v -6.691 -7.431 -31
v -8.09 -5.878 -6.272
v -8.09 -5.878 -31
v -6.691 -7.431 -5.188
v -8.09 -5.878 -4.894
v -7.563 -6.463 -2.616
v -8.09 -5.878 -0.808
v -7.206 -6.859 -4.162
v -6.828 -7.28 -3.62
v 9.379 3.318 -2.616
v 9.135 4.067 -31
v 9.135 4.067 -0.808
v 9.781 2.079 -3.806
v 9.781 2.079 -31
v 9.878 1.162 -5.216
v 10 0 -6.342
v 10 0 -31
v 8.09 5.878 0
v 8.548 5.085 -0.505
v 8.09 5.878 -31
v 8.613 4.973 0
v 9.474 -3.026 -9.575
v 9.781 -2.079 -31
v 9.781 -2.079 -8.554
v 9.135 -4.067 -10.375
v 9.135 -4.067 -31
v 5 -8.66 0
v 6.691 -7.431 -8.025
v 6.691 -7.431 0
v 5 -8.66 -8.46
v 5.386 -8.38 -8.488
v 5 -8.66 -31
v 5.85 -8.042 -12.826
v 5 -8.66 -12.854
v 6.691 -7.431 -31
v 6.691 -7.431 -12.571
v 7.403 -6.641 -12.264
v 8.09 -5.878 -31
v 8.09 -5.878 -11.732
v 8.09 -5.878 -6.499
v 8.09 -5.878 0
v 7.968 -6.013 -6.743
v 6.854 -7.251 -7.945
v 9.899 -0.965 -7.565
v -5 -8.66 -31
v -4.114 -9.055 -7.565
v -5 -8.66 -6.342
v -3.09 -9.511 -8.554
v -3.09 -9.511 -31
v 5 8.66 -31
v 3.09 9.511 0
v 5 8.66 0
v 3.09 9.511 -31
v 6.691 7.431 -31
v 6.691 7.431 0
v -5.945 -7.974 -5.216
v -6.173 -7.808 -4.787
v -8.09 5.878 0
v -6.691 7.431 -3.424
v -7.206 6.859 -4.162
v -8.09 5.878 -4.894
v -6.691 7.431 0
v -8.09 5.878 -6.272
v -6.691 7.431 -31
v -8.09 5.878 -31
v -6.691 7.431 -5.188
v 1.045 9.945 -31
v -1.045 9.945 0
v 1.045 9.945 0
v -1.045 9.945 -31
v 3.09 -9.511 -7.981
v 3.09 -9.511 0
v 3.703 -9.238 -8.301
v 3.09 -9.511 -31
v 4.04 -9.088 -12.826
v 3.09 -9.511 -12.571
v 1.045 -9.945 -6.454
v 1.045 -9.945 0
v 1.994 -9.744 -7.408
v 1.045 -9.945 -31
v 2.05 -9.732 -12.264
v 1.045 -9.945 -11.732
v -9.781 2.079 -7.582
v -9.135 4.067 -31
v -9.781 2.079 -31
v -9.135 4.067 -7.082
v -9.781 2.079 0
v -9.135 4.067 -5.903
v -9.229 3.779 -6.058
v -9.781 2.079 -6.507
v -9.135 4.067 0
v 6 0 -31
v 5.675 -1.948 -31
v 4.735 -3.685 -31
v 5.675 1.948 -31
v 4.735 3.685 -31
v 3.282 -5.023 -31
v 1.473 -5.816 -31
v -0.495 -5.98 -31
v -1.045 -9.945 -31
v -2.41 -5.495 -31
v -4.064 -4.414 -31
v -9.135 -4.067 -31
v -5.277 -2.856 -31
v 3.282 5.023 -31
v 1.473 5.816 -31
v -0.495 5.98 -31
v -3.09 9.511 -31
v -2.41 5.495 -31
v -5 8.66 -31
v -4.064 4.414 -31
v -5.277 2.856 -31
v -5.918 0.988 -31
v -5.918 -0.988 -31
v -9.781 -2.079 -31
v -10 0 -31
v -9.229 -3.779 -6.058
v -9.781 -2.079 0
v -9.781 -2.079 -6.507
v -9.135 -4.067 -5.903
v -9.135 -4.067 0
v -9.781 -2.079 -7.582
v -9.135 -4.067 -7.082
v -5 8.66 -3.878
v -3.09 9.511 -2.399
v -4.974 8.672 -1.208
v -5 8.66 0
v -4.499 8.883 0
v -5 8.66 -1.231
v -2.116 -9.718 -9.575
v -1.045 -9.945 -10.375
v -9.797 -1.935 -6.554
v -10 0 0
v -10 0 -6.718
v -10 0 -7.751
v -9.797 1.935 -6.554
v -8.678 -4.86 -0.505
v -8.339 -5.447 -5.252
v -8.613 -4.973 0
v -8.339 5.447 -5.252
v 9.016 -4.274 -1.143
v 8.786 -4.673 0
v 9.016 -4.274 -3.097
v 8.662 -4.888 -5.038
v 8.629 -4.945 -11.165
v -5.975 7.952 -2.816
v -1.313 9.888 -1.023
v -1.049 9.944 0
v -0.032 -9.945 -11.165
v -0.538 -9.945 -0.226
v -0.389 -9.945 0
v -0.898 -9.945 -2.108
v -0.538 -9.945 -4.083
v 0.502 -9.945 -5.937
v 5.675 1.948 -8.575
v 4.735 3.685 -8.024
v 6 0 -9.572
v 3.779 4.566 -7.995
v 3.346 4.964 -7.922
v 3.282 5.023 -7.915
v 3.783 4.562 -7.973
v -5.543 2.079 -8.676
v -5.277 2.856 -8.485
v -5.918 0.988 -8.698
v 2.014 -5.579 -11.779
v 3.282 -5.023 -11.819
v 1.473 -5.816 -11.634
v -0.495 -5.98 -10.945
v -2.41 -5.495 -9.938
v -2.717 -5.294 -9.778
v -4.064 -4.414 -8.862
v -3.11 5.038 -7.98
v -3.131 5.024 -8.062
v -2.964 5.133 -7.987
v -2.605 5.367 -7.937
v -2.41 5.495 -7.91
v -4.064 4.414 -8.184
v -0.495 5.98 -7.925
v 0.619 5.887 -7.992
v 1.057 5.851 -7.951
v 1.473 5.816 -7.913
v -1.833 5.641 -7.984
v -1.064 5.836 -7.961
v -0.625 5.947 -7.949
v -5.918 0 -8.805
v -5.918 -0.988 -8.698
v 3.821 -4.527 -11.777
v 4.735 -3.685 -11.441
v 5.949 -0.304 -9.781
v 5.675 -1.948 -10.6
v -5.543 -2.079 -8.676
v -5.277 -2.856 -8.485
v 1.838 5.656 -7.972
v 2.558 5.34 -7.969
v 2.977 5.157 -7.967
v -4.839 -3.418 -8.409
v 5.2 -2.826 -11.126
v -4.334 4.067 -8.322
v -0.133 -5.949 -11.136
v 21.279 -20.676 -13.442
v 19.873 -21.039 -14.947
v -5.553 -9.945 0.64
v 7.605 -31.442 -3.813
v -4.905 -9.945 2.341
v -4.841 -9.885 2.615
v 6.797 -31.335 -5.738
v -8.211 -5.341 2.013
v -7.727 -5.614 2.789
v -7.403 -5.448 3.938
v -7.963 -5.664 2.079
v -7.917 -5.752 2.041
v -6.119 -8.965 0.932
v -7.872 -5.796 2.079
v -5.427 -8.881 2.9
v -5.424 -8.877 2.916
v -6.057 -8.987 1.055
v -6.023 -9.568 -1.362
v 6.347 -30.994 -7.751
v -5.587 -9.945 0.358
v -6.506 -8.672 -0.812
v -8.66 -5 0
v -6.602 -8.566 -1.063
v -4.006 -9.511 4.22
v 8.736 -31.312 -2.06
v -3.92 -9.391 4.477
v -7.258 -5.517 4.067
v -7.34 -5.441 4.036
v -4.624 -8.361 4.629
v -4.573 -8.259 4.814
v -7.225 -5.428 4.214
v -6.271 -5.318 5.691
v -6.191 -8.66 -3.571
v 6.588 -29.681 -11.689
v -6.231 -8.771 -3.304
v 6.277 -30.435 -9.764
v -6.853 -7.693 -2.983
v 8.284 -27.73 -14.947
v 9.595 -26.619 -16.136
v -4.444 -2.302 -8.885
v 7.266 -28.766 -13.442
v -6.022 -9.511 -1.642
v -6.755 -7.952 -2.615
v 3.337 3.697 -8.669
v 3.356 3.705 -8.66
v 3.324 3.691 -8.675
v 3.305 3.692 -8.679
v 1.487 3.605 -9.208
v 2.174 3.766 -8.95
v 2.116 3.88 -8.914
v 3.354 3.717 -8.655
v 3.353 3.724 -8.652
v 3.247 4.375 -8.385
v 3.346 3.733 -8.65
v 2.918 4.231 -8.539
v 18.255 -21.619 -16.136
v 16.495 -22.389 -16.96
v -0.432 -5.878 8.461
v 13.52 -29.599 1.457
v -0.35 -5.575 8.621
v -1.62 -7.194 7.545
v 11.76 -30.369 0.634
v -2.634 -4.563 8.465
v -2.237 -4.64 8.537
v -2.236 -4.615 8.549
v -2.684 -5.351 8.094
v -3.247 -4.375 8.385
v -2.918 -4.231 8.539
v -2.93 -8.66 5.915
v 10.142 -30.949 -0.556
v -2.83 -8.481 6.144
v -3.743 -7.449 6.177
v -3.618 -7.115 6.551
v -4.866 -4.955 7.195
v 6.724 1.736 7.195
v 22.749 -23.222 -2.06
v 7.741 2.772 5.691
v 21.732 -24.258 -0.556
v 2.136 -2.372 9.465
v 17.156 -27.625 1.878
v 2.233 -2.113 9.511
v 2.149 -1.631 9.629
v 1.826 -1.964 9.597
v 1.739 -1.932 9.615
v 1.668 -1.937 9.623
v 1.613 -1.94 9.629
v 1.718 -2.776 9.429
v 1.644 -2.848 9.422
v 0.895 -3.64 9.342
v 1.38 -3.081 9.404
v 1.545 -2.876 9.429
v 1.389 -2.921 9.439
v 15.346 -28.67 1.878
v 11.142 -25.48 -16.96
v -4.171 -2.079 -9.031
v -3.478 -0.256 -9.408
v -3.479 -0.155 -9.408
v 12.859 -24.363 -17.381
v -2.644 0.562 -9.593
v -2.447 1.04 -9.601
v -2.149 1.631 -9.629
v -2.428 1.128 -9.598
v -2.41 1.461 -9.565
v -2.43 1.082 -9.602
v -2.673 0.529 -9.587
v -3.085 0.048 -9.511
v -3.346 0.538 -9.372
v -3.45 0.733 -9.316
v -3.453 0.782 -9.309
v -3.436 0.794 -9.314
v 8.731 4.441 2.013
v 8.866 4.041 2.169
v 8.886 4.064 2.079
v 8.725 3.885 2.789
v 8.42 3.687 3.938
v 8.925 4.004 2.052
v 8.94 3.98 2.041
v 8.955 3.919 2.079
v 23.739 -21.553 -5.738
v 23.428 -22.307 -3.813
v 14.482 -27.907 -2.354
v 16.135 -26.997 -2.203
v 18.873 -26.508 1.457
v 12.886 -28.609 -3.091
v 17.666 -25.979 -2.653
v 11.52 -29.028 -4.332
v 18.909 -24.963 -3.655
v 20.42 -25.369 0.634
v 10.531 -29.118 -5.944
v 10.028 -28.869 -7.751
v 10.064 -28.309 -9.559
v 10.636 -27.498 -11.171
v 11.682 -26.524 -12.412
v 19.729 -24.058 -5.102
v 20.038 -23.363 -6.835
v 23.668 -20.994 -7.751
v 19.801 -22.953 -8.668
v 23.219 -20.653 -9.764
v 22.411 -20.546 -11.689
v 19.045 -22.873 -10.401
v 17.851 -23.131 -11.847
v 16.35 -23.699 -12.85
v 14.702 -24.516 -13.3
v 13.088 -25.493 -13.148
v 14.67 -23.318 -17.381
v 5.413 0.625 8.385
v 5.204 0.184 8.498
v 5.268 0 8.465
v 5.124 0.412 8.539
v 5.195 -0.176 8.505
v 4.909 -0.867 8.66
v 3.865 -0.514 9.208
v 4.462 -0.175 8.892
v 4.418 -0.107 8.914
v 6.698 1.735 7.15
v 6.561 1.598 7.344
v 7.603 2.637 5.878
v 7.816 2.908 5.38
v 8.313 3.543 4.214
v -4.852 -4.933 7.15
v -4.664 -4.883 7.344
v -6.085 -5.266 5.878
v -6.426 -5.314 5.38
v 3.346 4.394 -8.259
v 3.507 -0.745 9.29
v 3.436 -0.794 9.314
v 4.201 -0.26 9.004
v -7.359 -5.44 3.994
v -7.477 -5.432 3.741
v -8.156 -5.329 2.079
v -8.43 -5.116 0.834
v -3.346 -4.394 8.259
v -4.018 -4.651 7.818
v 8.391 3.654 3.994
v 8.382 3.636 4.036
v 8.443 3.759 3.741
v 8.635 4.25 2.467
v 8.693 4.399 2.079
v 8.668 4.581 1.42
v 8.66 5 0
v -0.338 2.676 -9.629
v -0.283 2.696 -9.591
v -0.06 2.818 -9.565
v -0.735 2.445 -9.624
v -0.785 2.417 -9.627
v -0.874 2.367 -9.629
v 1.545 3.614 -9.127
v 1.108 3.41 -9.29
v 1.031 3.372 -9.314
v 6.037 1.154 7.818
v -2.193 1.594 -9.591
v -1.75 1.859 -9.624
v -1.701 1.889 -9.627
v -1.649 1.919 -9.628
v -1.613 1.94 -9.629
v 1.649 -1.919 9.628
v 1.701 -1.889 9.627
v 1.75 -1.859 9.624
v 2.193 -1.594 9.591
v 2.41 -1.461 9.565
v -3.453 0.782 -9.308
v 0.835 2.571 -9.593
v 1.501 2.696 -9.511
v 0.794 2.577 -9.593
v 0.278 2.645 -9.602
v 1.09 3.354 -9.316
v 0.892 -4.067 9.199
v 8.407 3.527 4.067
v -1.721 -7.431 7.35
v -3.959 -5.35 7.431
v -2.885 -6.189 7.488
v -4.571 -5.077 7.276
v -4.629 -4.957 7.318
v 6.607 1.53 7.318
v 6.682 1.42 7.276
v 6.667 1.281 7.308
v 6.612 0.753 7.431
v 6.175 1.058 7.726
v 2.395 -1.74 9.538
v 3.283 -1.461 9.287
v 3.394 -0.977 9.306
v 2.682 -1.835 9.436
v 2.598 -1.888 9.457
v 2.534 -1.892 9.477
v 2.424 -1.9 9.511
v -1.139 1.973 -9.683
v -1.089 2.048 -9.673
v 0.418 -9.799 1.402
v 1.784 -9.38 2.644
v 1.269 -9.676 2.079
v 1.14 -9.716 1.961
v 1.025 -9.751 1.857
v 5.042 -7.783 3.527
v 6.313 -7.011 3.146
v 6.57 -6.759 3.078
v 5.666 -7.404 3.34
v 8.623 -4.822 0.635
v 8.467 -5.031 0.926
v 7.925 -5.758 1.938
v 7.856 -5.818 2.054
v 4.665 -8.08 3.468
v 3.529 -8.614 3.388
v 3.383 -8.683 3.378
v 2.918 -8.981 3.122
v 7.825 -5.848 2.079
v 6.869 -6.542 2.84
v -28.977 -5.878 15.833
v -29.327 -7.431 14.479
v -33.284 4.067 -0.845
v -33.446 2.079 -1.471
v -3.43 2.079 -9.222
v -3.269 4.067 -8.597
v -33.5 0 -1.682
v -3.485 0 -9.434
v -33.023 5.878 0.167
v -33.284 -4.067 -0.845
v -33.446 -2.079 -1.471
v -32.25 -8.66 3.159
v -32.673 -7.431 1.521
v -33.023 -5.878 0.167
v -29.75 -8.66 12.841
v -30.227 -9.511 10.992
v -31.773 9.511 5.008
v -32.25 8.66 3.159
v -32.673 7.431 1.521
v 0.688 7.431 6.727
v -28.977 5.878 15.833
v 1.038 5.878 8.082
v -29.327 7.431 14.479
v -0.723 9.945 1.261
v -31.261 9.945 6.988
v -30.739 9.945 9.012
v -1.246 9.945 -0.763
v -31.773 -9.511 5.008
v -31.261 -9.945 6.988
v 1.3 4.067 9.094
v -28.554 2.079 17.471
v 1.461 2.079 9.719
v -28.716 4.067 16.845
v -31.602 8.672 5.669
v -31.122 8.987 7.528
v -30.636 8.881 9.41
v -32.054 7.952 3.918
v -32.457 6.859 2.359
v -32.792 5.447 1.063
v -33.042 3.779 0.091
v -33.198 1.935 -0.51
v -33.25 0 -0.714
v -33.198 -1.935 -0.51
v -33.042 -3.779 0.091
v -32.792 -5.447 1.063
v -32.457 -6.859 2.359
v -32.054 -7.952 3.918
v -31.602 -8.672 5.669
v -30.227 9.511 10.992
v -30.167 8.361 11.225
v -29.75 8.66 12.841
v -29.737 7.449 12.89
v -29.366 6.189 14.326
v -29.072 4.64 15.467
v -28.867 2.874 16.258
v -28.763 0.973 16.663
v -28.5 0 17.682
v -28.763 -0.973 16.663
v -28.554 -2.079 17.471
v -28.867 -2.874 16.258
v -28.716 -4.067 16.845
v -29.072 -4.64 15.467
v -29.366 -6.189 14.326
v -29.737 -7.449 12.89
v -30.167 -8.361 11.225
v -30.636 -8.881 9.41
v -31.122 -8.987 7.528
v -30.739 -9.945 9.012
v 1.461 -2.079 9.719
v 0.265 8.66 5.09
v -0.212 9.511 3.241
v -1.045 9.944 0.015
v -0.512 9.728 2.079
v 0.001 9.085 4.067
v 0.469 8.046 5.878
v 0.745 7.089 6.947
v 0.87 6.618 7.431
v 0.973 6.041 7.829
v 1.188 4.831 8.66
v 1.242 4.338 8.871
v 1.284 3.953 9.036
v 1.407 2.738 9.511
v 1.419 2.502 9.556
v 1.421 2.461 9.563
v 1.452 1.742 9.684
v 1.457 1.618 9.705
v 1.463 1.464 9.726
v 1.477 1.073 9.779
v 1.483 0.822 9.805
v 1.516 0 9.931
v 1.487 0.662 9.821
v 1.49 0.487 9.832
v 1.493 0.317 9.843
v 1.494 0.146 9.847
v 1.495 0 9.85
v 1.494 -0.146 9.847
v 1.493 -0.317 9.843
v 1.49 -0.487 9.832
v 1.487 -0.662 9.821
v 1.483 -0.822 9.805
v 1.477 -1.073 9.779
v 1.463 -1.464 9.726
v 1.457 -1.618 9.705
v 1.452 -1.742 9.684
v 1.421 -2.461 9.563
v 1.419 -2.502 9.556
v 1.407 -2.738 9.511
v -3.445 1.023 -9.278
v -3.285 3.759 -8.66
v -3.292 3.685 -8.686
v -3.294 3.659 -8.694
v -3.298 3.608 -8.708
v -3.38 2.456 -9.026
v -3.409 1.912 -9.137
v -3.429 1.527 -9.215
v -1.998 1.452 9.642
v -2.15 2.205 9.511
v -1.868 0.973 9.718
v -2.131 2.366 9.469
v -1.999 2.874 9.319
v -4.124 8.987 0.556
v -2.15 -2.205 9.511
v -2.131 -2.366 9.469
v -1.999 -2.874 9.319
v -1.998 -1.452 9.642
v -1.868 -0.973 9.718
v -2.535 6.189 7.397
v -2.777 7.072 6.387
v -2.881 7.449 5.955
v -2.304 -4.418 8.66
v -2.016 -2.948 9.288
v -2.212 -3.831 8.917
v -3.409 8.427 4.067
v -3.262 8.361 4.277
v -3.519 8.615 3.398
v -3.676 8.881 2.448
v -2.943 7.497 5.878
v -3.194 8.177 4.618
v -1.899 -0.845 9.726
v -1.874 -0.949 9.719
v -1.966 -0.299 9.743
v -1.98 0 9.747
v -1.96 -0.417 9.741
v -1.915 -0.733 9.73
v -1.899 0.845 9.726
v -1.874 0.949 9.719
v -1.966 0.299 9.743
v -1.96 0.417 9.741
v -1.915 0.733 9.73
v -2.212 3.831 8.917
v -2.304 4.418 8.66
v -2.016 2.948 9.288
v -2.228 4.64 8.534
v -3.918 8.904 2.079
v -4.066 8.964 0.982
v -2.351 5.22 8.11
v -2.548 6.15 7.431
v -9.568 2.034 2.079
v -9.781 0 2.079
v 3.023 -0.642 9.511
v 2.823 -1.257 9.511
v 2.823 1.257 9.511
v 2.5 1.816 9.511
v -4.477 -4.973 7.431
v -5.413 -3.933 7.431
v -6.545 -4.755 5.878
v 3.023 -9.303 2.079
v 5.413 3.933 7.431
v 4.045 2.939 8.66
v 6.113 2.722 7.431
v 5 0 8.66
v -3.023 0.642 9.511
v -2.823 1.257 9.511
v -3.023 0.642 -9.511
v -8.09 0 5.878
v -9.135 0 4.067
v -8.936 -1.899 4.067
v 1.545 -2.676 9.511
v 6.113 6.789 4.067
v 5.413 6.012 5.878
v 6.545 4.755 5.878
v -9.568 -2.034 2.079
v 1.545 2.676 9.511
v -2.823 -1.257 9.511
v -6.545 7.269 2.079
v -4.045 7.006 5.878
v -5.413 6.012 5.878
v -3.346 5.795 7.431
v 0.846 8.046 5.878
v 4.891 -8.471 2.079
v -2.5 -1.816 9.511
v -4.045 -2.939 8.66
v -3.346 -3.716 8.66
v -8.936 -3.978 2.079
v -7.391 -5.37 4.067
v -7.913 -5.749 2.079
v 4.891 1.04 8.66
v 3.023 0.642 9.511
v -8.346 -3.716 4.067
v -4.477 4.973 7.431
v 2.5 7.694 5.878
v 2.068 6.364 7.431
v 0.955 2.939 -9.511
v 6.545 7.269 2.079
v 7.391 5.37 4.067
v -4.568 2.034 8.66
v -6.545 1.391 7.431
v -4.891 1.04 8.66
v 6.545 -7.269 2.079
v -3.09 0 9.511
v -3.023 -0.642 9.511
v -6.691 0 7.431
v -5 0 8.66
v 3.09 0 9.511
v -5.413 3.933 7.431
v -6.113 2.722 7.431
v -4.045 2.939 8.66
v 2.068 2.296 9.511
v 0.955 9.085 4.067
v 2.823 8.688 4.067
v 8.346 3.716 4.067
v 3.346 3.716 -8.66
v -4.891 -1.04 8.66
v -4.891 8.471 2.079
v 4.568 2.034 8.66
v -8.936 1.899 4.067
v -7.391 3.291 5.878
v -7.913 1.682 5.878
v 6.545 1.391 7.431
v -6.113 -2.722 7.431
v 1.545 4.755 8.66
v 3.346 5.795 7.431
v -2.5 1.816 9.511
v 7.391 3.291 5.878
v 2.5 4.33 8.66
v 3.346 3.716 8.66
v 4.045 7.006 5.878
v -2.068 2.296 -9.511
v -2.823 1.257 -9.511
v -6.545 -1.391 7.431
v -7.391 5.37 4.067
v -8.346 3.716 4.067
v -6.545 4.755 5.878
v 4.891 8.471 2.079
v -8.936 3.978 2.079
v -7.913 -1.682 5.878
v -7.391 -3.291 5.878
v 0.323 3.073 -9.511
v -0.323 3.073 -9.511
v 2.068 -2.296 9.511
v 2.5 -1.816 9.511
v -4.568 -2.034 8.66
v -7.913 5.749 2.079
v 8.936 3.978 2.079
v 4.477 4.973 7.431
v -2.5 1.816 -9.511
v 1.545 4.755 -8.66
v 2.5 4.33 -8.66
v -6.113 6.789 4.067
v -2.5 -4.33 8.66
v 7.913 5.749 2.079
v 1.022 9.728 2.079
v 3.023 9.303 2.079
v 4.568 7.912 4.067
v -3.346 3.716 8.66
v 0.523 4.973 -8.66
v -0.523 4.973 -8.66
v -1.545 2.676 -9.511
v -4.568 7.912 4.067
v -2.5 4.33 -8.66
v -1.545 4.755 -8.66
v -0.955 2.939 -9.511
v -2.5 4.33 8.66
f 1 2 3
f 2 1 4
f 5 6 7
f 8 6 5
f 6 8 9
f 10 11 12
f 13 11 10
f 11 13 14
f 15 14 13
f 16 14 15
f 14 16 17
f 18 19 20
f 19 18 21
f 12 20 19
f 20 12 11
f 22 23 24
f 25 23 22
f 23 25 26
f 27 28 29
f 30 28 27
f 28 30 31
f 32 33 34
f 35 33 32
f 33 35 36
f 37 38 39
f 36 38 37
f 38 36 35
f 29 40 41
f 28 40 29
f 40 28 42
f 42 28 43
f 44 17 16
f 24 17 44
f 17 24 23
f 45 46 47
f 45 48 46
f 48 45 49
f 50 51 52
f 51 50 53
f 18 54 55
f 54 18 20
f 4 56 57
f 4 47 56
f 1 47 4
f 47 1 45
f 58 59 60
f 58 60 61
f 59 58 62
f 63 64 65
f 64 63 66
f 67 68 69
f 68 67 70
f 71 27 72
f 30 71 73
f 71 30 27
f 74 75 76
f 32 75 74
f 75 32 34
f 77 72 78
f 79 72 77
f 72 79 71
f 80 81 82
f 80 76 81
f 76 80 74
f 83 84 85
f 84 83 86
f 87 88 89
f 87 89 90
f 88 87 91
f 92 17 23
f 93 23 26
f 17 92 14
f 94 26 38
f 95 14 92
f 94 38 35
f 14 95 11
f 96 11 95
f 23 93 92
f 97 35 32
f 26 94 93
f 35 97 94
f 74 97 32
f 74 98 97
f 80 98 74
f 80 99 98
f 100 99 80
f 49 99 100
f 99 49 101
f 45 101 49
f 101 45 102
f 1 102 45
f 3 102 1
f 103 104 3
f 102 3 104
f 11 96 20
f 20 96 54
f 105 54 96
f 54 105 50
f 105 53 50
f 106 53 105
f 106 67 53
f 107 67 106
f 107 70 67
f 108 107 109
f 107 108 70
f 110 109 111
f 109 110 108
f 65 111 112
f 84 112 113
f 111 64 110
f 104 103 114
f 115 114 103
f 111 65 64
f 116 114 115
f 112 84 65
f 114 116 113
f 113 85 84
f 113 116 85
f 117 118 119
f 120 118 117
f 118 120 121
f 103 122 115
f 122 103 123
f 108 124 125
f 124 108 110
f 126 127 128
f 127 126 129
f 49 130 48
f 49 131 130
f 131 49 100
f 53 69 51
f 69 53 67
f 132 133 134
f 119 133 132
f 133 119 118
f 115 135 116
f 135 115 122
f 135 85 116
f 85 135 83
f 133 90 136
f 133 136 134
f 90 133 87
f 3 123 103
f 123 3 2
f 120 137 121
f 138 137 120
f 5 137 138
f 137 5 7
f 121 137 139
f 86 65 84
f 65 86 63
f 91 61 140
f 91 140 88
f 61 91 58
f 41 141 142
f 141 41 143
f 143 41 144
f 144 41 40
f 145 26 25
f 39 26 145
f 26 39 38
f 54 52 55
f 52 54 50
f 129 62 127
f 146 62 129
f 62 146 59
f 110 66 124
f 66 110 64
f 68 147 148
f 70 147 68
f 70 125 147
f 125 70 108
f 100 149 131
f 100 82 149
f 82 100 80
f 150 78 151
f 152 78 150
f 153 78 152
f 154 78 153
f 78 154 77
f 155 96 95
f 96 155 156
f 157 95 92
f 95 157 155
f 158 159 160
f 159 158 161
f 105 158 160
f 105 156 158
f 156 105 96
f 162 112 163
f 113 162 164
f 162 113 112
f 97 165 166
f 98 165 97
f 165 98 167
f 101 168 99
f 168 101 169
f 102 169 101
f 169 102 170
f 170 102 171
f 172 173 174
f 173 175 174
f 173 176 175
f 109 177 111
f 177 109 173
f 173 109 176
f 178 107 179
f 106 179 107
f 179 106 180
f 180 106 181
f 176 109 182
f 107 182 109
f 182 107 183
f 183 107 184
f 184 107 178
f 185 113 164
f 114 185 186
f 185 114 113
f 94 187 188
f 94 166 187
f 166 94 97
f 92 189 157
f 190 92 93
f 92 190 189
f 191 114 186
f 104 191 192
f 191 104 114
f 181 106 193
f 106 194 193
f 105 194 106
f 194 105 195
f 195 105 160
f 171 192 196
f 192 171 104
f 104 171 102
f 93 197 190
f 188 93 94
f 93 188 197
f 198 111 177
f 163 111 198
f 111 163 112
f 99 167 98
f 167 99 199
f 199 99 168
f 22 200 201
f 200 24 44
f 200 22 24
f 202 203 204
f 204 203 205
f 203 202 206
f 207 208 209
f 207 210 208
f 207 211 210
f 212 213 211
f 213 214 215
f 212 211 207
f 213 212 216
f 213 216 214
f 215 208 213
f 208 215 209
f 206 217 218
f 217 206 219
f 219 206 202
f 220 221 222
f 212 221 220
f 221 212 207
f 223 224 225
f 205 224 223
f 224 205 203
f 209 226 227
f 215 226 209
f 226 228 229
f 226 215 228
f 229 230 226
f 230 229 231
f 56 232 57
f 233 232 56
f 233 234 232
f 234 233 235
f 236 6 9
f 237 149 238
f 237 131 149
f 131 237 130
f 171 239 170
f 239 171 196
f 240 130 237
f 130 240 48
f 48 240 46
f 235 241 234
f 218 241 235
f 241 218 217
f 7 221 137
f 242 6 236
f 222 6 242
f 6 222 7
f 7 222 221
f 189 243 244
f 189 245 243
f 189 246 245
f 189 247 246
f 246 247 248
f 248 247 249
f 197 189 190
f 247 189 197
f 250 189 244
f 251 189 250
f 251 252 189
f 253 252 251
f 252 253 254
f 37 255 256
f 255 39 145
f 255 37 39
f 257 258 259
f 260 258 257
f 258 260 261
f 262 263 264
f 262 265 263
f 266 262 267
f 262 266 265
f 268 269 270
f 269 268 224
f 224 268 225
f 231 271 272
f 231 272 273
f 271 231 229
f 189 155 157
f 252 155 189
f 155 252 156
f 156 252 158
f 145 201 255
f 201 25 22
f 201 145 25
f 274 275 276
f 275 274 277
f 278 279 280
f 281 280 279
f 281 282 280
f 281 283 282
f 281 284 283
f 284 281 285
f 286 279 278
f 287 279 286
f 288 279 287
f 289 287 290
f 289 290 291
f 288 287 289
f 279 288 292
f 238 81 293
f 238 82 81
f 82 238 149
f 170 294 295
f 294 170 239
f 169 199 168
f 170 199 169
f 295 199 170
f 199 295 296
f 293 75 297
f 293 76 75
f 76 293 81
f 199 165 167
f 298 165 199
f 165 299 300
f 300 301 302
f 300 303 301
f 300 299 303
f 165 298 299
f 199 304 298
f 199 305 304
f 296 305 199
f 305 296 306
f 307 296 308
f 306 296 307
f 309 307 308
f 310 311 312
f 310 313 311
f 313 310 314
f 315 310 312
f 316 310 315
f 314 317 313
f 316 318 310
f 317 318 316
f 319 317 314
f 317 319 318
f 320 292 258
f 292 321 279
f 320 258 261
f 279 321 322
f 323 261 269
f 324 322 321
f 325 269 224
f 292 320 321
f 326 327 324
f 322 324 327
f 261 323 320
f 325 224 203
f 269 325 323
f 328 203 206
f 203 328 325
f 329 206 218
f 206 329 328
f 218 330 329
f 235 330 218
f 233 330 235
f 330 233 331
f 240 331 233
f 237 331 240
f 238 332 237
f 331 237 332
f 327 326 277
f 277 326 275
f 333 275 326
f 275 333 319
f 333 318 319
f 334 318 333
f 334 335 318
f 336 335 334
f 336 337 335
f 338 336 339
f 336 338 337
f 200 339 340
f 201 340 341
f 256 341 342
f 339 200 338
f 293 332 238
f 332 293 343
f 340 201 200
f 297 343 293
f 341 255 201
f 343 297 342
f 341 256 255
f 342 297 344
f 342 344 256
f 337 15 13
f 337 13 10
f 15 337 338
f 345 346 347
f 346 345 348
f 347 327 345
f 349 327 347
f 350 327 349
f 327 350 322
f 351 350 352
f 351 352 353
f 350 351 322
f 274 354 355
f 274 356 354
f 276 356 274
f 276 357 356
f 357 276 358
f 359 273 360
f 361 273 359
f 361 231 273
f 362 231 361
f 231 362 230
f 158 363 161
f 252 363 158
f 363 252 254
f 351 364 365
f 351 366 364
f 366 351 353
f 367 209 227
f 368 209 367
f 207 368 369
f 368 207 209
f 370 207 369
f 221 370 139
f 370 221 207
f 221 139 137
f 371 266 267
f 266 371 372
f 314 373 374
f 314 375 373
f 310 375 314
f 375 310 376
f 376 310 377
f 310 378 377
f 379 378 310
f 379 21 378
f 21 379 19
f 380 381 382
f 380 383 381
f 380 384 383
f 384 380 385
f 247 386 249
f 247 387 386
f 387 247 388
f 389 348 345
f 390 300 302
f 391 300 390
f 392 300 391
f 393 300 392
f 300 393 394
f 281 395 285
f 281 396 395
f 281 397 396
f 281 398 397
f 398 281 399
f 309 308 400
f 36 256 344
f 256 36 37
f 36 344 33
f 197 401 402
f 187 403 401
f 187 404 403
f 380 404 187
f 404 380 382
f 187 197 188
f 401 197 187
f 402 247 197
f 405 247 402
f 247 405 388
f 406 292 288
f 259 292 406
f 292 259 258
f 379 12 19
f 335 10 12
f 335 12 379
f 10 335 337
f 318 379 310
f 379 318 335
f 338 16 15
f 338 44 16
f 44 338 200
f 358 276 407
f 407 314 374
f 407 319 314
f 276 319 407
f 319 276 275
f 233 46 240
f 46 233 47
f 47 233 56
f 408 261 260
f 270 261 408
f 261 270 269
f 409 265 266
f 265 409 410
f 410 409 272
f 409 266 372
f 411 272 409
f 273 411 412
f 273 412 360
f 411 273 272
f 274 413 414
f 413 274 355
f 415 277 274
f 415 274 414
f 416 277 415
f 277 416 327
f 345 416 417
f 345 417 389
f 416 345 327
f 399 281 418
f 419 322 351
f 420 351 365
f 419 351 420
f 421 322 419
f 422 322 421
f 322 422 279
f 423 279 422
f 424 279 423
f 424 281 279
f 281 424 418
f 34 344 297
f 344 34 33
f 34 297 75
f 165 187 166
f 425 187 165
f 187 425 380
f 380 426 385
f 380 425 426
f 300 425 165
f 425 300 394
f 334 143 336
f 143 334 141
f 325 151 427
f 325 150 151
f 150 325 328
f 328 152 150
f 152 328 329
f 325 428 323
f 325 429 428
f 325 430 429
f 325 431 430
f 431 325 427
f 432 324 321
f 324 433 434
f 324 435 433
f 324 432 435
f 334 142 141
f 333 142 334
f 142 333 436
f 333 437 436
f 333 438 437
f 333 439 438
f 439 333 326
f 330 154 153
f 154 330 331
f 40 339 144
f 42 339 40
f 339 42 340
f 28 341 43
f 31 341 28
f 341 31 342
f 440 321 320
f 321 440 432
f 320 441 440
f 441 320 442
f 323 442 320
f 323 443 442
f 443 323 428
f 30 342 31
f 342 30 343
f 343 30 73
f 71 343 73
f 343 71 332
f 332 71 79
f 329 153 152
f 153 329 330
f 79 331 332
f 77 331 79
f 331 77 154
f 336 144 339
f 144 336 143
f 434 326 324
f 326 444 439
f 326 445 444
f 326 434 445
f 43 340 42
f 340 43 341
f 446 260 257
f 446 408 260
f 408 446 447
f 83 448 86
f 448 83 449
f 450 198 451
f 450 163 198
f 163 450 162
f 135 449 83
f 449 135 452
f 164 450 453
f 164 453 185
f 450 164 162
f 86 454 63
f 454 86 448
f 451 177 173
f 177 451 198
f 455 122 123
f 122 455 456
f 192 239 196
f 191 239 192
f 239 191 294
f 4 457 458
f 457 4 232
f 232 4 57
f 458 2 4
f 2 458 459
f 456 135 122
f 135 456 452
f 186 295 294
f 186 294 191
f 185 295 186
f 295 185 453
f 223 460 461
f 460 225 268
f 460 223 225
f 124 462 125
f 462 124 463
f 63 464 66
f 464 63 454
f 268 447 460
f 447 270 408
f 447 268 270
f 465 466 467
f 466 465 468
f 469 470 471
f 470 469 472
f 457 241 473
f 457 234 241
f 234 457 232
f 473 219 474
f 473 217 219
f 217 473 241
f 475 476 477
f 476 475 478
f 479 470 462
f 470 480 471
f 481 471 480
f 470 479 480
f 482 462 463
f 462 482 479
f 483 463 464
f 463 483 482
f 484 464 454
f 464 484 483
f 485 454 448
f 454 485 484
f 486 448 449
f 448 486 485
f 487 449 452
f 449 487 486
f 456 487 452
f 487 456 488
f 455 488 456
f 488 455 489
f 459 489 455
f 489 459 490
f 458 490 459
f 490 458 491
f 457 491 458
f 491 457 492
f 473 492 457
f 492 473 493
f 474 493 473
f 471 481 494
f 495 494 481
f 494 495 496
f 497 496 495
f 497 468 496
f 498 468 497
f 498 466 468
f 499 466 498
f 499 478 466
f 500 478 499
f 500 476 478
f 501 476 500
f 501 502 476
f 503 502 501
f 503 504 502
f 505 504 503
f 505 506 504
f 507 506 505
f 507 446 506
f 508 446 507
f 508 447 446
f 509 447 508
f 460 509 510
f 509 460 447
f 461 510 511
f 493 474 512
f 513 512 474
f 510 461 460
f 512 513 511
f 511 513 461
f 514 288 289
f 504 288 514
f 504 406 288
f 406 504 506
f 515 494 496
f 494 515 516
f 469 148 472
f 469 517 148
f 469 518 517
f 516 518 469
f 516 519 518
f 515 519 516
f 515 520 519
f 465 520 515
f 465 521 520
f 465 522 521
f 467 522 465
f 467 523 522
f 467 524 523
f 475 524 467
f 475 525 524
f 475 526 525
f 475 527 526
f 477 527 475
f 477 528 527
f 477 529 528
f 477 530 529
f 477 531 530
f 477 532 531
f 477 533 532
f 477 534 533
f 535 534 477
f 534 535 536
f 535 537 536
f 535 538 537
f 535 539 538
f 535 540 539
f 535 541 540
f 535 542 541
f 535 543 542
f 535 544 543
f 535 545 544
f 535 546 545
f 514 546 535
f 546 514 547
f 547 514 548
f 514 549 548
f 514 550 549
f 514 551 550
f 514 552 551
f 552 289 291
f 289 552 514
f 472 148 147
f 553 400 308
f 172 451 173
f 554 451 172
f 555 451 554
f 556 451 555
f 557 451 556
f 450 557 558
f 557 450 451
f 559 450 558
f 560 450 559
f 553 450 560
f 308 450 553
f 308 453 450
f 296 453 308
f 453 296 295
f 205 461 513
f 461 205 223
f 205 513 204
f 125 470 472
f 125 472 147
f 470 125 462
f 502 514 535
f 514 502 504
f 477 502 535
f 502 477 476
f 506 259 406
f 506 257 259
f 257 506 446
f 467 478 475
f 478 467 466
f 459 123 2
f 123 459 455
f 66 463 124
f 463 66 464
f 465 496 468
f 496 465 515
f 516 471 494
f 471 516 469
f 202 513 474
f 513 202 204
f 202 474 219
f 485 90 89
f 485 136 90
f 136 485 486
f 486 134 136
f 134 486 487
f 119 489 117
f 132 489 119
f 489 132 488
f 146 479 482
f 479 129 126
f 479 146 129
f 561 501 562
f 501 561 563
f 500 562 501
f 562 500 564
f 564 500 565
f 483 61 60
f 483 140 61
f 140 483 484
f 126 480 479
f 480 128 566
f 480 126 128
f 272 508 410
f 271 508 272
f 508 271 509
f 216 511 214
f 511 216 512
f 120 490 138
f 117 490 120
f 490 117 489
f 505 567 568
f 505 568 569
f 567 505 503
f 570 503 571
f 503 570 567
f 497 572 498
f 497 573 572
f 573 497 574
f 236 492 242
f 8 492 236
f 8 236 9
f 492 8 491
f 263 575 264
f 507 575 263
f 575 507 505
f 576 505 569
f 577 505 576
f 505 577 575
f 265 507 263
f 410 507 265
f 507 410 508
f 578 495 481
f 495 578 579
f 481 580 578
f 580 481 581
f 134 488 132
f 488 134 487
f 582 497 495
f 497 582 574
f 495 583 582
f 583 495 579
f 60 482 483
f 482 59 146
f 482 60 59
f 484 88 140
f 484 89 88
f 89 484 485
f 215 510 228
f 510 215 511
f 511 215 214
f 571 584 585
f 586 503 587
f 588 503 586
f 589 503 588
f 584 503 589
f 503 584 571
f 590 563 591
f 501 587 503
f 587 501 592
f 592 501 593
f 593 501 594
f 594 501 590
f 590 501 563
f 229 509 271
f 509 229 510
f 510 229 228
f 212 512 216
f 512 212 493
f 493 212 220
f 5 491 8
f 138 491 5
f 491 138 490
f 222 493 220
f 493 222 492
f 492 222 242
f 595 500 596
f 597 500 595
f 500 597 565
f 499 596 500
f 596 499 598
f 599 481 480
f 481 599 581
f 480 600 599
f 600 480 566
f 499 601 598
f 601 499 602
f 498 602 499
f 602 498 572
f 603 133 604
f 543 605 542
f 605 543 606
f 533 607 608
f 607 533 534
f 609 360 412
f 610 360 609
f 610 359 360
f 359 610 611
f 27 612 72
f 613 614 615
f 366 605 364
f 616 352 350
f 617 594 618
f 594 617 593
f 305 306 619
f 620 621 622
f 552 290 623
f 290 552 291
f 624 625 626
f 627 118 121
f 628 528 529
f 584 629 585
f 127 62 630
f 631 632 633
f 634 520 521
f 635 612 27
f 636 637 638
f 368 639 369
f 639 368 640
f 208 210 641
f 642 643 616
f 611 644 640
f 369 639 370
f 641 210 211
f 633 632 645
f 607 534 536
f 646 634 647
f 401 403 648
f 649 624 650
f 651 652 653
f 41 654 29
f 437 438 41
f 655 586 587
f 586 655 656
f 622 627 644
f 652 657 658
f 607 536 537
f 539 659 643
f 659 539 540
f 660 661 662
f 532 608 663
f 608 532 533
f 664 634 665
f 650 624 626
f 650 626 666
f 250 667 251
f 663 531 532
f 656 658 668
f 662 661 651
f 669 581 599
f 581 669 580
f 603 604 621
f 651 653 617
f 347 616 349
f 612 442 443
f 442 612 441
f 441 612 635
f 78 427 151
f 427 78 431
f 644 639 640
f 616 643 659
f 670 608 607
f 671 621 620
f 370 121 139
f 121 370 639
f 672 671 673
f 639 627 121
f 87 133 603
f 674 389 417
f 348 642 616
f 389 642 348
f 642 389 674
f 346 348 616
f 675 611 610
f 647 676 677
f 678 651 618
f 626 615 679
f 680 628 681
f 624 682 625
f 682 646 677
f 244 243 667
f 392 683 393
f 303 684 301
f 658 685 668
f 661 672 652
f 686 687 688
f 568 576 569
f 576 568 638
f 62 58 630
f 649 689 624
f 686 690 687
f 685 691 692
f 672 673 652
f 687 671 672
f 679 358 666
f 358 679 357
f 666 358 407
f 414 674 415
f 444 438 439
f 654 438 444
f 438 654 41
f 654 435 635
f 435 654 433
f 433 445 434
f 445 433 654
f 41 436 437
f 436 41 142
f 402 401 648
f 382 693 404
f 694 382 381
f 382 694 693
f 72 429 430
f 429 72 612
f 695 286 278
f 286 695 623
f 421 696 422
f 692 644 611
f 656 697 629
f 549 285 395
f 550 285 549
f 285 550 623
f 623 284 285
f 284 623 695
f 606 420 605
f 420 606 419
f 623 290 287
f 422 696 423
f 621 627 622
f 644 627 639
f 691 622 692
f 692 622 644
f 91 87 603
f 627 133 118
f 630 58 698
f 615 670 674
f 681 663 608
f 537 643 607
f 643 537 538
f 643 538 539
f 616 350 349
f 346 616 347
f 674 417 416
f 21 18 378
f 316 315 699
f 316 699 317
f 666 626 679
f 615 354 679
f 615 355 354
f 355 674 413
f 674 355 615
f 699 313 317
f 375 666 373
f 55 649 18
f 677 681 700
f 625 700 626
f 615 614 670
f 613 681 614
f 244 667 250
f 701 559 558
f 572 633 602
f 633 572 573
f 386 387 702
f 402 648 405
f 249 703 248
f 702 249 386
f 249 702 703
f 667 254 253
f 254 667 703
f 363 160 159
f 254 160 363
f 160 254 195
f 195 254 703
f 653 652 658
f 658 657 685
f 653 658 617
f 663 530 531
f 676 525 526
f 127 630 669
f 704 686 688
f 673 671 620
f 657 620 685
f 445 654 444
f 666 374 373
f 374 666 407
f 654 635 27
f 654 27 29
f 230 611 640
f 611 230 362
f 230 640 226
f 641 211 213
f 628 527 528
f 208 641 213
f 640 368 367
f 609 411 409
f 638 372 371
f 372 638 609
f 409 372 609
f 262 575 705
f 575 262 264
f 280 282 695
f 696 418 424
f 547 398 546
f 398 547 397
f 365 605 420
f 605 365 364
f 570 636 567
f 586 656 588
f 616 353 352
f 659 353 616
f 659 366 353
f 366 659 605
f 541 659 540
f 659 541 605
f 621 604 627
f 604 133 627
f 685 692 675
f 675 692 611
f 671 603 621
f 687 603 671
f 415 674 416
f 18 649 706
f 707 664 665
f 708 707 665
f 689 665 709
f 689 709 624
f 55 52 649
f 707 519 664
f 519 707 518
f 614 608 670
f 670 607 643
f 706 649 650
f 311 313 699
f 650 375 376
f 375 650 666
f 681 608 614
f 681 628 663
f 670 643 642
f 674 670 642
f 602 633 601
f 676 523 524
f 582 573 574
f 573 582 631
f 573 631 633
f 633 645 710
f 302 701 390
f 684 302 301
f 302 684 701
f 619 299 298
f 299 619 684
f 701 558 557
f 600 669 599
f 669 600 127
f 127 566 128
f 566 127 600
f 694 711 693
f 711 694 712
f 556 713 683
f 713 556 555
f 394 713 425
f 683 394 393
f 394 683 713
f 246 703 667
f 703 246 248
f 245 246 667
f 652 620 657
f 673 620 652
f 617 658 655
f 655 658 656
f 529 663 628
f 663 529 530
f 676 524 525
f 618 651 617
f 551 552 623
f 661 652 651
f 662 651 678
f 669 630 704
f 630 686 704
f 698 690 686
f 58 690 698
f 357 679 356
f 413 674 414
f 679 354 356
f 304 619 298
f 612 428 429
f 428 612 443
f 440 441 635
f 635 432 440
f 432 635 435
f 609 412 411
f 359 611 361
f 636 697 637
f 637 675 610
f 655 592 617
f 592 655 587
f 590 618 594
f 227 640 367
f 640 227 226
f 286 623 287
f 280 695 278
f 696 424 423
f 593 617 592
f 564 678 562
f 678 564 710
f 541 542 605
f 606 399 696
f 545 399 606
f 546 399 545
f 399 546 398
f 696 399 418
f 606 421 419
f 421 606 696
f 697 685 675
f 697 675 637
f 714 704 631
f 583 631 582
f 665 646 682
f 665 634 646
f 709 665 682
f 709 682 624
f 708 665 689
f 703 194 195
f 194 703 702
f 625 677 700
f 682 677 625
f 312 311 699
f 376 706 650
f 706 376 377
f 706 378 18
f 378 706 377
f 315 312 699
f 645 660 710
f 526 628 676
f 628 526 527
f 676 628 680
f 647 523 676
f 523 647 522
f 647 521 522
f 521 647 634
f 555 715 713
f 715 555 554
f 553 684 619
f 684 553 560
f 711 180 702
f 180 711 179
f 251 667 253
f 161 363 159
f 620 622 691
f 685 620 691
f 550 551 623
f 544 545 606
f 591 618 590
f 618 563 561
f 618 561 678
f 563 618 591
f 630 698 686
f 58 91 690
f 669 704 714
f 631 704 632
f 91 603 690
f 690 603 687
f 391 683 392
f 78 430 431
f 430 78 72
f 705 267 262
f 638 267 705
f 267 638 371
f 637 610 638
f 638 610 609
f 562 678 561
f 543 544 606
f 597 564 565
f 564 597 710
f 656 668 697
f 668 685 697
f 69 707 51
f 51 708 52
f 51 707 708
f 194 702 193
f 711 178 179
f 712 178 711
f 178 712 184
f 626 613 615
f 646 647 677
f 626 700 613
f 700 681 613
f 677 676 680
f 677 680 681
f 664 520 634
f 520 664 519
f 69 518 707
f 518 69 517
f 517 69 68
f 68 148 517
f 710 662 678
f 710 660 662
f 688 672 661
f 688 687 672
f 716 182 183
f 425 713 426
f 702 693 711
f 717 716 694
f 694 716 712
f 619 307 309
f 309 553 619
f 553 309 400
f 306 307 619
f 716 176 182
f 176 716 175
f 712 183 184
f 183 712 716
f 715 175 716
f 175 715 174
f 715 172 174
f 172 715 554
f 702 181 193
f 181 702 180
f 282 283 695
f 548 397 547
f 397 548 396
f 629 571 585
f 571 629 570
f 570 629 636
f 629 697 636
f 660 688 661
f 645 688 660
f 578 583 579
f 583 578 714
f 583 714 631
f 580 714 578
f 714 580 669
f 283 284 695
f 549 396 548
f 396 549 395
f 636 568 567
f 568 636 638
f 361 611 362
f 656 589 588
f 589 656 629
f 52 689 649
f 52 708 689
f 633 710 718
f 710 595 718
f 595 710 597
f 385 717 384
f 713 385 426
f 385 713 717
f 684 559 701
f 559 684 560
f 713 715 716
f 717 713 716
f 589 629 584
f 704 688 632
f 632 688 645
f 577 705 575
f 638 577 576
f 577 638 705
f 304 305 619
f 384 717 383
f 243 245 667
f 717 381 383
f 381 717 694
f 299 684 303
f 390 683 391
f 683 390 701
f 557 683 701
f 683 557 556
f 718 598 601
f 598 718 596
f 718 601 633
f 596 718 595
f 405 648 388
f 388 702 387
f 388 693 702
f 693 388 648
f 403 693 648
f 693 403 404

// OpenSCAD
width=10;

sphere (10);

//cylinder 1 z たて
difference(){
    translate ([0,0,-31])cylinder(h=31, d=20);
    translate([0,0,-33])cylinder(h=30, d=12);
}

//cylinder 2
rotate([75.52,0,-150])difference(){
        translate ([0,0,-31])
        cylinder (h=31, d=20);
        translate([0,0,-32])
        cylinder(h=31, d=11.5); 
        }

//cylinder 3        
translate([-31,0,8]) rotate([0,104.48,0])difference(){
        cylinder (h=31, d=20);
        translate([0,0,+3]) ;
        cylinder(h=30, d=18); 
        }
